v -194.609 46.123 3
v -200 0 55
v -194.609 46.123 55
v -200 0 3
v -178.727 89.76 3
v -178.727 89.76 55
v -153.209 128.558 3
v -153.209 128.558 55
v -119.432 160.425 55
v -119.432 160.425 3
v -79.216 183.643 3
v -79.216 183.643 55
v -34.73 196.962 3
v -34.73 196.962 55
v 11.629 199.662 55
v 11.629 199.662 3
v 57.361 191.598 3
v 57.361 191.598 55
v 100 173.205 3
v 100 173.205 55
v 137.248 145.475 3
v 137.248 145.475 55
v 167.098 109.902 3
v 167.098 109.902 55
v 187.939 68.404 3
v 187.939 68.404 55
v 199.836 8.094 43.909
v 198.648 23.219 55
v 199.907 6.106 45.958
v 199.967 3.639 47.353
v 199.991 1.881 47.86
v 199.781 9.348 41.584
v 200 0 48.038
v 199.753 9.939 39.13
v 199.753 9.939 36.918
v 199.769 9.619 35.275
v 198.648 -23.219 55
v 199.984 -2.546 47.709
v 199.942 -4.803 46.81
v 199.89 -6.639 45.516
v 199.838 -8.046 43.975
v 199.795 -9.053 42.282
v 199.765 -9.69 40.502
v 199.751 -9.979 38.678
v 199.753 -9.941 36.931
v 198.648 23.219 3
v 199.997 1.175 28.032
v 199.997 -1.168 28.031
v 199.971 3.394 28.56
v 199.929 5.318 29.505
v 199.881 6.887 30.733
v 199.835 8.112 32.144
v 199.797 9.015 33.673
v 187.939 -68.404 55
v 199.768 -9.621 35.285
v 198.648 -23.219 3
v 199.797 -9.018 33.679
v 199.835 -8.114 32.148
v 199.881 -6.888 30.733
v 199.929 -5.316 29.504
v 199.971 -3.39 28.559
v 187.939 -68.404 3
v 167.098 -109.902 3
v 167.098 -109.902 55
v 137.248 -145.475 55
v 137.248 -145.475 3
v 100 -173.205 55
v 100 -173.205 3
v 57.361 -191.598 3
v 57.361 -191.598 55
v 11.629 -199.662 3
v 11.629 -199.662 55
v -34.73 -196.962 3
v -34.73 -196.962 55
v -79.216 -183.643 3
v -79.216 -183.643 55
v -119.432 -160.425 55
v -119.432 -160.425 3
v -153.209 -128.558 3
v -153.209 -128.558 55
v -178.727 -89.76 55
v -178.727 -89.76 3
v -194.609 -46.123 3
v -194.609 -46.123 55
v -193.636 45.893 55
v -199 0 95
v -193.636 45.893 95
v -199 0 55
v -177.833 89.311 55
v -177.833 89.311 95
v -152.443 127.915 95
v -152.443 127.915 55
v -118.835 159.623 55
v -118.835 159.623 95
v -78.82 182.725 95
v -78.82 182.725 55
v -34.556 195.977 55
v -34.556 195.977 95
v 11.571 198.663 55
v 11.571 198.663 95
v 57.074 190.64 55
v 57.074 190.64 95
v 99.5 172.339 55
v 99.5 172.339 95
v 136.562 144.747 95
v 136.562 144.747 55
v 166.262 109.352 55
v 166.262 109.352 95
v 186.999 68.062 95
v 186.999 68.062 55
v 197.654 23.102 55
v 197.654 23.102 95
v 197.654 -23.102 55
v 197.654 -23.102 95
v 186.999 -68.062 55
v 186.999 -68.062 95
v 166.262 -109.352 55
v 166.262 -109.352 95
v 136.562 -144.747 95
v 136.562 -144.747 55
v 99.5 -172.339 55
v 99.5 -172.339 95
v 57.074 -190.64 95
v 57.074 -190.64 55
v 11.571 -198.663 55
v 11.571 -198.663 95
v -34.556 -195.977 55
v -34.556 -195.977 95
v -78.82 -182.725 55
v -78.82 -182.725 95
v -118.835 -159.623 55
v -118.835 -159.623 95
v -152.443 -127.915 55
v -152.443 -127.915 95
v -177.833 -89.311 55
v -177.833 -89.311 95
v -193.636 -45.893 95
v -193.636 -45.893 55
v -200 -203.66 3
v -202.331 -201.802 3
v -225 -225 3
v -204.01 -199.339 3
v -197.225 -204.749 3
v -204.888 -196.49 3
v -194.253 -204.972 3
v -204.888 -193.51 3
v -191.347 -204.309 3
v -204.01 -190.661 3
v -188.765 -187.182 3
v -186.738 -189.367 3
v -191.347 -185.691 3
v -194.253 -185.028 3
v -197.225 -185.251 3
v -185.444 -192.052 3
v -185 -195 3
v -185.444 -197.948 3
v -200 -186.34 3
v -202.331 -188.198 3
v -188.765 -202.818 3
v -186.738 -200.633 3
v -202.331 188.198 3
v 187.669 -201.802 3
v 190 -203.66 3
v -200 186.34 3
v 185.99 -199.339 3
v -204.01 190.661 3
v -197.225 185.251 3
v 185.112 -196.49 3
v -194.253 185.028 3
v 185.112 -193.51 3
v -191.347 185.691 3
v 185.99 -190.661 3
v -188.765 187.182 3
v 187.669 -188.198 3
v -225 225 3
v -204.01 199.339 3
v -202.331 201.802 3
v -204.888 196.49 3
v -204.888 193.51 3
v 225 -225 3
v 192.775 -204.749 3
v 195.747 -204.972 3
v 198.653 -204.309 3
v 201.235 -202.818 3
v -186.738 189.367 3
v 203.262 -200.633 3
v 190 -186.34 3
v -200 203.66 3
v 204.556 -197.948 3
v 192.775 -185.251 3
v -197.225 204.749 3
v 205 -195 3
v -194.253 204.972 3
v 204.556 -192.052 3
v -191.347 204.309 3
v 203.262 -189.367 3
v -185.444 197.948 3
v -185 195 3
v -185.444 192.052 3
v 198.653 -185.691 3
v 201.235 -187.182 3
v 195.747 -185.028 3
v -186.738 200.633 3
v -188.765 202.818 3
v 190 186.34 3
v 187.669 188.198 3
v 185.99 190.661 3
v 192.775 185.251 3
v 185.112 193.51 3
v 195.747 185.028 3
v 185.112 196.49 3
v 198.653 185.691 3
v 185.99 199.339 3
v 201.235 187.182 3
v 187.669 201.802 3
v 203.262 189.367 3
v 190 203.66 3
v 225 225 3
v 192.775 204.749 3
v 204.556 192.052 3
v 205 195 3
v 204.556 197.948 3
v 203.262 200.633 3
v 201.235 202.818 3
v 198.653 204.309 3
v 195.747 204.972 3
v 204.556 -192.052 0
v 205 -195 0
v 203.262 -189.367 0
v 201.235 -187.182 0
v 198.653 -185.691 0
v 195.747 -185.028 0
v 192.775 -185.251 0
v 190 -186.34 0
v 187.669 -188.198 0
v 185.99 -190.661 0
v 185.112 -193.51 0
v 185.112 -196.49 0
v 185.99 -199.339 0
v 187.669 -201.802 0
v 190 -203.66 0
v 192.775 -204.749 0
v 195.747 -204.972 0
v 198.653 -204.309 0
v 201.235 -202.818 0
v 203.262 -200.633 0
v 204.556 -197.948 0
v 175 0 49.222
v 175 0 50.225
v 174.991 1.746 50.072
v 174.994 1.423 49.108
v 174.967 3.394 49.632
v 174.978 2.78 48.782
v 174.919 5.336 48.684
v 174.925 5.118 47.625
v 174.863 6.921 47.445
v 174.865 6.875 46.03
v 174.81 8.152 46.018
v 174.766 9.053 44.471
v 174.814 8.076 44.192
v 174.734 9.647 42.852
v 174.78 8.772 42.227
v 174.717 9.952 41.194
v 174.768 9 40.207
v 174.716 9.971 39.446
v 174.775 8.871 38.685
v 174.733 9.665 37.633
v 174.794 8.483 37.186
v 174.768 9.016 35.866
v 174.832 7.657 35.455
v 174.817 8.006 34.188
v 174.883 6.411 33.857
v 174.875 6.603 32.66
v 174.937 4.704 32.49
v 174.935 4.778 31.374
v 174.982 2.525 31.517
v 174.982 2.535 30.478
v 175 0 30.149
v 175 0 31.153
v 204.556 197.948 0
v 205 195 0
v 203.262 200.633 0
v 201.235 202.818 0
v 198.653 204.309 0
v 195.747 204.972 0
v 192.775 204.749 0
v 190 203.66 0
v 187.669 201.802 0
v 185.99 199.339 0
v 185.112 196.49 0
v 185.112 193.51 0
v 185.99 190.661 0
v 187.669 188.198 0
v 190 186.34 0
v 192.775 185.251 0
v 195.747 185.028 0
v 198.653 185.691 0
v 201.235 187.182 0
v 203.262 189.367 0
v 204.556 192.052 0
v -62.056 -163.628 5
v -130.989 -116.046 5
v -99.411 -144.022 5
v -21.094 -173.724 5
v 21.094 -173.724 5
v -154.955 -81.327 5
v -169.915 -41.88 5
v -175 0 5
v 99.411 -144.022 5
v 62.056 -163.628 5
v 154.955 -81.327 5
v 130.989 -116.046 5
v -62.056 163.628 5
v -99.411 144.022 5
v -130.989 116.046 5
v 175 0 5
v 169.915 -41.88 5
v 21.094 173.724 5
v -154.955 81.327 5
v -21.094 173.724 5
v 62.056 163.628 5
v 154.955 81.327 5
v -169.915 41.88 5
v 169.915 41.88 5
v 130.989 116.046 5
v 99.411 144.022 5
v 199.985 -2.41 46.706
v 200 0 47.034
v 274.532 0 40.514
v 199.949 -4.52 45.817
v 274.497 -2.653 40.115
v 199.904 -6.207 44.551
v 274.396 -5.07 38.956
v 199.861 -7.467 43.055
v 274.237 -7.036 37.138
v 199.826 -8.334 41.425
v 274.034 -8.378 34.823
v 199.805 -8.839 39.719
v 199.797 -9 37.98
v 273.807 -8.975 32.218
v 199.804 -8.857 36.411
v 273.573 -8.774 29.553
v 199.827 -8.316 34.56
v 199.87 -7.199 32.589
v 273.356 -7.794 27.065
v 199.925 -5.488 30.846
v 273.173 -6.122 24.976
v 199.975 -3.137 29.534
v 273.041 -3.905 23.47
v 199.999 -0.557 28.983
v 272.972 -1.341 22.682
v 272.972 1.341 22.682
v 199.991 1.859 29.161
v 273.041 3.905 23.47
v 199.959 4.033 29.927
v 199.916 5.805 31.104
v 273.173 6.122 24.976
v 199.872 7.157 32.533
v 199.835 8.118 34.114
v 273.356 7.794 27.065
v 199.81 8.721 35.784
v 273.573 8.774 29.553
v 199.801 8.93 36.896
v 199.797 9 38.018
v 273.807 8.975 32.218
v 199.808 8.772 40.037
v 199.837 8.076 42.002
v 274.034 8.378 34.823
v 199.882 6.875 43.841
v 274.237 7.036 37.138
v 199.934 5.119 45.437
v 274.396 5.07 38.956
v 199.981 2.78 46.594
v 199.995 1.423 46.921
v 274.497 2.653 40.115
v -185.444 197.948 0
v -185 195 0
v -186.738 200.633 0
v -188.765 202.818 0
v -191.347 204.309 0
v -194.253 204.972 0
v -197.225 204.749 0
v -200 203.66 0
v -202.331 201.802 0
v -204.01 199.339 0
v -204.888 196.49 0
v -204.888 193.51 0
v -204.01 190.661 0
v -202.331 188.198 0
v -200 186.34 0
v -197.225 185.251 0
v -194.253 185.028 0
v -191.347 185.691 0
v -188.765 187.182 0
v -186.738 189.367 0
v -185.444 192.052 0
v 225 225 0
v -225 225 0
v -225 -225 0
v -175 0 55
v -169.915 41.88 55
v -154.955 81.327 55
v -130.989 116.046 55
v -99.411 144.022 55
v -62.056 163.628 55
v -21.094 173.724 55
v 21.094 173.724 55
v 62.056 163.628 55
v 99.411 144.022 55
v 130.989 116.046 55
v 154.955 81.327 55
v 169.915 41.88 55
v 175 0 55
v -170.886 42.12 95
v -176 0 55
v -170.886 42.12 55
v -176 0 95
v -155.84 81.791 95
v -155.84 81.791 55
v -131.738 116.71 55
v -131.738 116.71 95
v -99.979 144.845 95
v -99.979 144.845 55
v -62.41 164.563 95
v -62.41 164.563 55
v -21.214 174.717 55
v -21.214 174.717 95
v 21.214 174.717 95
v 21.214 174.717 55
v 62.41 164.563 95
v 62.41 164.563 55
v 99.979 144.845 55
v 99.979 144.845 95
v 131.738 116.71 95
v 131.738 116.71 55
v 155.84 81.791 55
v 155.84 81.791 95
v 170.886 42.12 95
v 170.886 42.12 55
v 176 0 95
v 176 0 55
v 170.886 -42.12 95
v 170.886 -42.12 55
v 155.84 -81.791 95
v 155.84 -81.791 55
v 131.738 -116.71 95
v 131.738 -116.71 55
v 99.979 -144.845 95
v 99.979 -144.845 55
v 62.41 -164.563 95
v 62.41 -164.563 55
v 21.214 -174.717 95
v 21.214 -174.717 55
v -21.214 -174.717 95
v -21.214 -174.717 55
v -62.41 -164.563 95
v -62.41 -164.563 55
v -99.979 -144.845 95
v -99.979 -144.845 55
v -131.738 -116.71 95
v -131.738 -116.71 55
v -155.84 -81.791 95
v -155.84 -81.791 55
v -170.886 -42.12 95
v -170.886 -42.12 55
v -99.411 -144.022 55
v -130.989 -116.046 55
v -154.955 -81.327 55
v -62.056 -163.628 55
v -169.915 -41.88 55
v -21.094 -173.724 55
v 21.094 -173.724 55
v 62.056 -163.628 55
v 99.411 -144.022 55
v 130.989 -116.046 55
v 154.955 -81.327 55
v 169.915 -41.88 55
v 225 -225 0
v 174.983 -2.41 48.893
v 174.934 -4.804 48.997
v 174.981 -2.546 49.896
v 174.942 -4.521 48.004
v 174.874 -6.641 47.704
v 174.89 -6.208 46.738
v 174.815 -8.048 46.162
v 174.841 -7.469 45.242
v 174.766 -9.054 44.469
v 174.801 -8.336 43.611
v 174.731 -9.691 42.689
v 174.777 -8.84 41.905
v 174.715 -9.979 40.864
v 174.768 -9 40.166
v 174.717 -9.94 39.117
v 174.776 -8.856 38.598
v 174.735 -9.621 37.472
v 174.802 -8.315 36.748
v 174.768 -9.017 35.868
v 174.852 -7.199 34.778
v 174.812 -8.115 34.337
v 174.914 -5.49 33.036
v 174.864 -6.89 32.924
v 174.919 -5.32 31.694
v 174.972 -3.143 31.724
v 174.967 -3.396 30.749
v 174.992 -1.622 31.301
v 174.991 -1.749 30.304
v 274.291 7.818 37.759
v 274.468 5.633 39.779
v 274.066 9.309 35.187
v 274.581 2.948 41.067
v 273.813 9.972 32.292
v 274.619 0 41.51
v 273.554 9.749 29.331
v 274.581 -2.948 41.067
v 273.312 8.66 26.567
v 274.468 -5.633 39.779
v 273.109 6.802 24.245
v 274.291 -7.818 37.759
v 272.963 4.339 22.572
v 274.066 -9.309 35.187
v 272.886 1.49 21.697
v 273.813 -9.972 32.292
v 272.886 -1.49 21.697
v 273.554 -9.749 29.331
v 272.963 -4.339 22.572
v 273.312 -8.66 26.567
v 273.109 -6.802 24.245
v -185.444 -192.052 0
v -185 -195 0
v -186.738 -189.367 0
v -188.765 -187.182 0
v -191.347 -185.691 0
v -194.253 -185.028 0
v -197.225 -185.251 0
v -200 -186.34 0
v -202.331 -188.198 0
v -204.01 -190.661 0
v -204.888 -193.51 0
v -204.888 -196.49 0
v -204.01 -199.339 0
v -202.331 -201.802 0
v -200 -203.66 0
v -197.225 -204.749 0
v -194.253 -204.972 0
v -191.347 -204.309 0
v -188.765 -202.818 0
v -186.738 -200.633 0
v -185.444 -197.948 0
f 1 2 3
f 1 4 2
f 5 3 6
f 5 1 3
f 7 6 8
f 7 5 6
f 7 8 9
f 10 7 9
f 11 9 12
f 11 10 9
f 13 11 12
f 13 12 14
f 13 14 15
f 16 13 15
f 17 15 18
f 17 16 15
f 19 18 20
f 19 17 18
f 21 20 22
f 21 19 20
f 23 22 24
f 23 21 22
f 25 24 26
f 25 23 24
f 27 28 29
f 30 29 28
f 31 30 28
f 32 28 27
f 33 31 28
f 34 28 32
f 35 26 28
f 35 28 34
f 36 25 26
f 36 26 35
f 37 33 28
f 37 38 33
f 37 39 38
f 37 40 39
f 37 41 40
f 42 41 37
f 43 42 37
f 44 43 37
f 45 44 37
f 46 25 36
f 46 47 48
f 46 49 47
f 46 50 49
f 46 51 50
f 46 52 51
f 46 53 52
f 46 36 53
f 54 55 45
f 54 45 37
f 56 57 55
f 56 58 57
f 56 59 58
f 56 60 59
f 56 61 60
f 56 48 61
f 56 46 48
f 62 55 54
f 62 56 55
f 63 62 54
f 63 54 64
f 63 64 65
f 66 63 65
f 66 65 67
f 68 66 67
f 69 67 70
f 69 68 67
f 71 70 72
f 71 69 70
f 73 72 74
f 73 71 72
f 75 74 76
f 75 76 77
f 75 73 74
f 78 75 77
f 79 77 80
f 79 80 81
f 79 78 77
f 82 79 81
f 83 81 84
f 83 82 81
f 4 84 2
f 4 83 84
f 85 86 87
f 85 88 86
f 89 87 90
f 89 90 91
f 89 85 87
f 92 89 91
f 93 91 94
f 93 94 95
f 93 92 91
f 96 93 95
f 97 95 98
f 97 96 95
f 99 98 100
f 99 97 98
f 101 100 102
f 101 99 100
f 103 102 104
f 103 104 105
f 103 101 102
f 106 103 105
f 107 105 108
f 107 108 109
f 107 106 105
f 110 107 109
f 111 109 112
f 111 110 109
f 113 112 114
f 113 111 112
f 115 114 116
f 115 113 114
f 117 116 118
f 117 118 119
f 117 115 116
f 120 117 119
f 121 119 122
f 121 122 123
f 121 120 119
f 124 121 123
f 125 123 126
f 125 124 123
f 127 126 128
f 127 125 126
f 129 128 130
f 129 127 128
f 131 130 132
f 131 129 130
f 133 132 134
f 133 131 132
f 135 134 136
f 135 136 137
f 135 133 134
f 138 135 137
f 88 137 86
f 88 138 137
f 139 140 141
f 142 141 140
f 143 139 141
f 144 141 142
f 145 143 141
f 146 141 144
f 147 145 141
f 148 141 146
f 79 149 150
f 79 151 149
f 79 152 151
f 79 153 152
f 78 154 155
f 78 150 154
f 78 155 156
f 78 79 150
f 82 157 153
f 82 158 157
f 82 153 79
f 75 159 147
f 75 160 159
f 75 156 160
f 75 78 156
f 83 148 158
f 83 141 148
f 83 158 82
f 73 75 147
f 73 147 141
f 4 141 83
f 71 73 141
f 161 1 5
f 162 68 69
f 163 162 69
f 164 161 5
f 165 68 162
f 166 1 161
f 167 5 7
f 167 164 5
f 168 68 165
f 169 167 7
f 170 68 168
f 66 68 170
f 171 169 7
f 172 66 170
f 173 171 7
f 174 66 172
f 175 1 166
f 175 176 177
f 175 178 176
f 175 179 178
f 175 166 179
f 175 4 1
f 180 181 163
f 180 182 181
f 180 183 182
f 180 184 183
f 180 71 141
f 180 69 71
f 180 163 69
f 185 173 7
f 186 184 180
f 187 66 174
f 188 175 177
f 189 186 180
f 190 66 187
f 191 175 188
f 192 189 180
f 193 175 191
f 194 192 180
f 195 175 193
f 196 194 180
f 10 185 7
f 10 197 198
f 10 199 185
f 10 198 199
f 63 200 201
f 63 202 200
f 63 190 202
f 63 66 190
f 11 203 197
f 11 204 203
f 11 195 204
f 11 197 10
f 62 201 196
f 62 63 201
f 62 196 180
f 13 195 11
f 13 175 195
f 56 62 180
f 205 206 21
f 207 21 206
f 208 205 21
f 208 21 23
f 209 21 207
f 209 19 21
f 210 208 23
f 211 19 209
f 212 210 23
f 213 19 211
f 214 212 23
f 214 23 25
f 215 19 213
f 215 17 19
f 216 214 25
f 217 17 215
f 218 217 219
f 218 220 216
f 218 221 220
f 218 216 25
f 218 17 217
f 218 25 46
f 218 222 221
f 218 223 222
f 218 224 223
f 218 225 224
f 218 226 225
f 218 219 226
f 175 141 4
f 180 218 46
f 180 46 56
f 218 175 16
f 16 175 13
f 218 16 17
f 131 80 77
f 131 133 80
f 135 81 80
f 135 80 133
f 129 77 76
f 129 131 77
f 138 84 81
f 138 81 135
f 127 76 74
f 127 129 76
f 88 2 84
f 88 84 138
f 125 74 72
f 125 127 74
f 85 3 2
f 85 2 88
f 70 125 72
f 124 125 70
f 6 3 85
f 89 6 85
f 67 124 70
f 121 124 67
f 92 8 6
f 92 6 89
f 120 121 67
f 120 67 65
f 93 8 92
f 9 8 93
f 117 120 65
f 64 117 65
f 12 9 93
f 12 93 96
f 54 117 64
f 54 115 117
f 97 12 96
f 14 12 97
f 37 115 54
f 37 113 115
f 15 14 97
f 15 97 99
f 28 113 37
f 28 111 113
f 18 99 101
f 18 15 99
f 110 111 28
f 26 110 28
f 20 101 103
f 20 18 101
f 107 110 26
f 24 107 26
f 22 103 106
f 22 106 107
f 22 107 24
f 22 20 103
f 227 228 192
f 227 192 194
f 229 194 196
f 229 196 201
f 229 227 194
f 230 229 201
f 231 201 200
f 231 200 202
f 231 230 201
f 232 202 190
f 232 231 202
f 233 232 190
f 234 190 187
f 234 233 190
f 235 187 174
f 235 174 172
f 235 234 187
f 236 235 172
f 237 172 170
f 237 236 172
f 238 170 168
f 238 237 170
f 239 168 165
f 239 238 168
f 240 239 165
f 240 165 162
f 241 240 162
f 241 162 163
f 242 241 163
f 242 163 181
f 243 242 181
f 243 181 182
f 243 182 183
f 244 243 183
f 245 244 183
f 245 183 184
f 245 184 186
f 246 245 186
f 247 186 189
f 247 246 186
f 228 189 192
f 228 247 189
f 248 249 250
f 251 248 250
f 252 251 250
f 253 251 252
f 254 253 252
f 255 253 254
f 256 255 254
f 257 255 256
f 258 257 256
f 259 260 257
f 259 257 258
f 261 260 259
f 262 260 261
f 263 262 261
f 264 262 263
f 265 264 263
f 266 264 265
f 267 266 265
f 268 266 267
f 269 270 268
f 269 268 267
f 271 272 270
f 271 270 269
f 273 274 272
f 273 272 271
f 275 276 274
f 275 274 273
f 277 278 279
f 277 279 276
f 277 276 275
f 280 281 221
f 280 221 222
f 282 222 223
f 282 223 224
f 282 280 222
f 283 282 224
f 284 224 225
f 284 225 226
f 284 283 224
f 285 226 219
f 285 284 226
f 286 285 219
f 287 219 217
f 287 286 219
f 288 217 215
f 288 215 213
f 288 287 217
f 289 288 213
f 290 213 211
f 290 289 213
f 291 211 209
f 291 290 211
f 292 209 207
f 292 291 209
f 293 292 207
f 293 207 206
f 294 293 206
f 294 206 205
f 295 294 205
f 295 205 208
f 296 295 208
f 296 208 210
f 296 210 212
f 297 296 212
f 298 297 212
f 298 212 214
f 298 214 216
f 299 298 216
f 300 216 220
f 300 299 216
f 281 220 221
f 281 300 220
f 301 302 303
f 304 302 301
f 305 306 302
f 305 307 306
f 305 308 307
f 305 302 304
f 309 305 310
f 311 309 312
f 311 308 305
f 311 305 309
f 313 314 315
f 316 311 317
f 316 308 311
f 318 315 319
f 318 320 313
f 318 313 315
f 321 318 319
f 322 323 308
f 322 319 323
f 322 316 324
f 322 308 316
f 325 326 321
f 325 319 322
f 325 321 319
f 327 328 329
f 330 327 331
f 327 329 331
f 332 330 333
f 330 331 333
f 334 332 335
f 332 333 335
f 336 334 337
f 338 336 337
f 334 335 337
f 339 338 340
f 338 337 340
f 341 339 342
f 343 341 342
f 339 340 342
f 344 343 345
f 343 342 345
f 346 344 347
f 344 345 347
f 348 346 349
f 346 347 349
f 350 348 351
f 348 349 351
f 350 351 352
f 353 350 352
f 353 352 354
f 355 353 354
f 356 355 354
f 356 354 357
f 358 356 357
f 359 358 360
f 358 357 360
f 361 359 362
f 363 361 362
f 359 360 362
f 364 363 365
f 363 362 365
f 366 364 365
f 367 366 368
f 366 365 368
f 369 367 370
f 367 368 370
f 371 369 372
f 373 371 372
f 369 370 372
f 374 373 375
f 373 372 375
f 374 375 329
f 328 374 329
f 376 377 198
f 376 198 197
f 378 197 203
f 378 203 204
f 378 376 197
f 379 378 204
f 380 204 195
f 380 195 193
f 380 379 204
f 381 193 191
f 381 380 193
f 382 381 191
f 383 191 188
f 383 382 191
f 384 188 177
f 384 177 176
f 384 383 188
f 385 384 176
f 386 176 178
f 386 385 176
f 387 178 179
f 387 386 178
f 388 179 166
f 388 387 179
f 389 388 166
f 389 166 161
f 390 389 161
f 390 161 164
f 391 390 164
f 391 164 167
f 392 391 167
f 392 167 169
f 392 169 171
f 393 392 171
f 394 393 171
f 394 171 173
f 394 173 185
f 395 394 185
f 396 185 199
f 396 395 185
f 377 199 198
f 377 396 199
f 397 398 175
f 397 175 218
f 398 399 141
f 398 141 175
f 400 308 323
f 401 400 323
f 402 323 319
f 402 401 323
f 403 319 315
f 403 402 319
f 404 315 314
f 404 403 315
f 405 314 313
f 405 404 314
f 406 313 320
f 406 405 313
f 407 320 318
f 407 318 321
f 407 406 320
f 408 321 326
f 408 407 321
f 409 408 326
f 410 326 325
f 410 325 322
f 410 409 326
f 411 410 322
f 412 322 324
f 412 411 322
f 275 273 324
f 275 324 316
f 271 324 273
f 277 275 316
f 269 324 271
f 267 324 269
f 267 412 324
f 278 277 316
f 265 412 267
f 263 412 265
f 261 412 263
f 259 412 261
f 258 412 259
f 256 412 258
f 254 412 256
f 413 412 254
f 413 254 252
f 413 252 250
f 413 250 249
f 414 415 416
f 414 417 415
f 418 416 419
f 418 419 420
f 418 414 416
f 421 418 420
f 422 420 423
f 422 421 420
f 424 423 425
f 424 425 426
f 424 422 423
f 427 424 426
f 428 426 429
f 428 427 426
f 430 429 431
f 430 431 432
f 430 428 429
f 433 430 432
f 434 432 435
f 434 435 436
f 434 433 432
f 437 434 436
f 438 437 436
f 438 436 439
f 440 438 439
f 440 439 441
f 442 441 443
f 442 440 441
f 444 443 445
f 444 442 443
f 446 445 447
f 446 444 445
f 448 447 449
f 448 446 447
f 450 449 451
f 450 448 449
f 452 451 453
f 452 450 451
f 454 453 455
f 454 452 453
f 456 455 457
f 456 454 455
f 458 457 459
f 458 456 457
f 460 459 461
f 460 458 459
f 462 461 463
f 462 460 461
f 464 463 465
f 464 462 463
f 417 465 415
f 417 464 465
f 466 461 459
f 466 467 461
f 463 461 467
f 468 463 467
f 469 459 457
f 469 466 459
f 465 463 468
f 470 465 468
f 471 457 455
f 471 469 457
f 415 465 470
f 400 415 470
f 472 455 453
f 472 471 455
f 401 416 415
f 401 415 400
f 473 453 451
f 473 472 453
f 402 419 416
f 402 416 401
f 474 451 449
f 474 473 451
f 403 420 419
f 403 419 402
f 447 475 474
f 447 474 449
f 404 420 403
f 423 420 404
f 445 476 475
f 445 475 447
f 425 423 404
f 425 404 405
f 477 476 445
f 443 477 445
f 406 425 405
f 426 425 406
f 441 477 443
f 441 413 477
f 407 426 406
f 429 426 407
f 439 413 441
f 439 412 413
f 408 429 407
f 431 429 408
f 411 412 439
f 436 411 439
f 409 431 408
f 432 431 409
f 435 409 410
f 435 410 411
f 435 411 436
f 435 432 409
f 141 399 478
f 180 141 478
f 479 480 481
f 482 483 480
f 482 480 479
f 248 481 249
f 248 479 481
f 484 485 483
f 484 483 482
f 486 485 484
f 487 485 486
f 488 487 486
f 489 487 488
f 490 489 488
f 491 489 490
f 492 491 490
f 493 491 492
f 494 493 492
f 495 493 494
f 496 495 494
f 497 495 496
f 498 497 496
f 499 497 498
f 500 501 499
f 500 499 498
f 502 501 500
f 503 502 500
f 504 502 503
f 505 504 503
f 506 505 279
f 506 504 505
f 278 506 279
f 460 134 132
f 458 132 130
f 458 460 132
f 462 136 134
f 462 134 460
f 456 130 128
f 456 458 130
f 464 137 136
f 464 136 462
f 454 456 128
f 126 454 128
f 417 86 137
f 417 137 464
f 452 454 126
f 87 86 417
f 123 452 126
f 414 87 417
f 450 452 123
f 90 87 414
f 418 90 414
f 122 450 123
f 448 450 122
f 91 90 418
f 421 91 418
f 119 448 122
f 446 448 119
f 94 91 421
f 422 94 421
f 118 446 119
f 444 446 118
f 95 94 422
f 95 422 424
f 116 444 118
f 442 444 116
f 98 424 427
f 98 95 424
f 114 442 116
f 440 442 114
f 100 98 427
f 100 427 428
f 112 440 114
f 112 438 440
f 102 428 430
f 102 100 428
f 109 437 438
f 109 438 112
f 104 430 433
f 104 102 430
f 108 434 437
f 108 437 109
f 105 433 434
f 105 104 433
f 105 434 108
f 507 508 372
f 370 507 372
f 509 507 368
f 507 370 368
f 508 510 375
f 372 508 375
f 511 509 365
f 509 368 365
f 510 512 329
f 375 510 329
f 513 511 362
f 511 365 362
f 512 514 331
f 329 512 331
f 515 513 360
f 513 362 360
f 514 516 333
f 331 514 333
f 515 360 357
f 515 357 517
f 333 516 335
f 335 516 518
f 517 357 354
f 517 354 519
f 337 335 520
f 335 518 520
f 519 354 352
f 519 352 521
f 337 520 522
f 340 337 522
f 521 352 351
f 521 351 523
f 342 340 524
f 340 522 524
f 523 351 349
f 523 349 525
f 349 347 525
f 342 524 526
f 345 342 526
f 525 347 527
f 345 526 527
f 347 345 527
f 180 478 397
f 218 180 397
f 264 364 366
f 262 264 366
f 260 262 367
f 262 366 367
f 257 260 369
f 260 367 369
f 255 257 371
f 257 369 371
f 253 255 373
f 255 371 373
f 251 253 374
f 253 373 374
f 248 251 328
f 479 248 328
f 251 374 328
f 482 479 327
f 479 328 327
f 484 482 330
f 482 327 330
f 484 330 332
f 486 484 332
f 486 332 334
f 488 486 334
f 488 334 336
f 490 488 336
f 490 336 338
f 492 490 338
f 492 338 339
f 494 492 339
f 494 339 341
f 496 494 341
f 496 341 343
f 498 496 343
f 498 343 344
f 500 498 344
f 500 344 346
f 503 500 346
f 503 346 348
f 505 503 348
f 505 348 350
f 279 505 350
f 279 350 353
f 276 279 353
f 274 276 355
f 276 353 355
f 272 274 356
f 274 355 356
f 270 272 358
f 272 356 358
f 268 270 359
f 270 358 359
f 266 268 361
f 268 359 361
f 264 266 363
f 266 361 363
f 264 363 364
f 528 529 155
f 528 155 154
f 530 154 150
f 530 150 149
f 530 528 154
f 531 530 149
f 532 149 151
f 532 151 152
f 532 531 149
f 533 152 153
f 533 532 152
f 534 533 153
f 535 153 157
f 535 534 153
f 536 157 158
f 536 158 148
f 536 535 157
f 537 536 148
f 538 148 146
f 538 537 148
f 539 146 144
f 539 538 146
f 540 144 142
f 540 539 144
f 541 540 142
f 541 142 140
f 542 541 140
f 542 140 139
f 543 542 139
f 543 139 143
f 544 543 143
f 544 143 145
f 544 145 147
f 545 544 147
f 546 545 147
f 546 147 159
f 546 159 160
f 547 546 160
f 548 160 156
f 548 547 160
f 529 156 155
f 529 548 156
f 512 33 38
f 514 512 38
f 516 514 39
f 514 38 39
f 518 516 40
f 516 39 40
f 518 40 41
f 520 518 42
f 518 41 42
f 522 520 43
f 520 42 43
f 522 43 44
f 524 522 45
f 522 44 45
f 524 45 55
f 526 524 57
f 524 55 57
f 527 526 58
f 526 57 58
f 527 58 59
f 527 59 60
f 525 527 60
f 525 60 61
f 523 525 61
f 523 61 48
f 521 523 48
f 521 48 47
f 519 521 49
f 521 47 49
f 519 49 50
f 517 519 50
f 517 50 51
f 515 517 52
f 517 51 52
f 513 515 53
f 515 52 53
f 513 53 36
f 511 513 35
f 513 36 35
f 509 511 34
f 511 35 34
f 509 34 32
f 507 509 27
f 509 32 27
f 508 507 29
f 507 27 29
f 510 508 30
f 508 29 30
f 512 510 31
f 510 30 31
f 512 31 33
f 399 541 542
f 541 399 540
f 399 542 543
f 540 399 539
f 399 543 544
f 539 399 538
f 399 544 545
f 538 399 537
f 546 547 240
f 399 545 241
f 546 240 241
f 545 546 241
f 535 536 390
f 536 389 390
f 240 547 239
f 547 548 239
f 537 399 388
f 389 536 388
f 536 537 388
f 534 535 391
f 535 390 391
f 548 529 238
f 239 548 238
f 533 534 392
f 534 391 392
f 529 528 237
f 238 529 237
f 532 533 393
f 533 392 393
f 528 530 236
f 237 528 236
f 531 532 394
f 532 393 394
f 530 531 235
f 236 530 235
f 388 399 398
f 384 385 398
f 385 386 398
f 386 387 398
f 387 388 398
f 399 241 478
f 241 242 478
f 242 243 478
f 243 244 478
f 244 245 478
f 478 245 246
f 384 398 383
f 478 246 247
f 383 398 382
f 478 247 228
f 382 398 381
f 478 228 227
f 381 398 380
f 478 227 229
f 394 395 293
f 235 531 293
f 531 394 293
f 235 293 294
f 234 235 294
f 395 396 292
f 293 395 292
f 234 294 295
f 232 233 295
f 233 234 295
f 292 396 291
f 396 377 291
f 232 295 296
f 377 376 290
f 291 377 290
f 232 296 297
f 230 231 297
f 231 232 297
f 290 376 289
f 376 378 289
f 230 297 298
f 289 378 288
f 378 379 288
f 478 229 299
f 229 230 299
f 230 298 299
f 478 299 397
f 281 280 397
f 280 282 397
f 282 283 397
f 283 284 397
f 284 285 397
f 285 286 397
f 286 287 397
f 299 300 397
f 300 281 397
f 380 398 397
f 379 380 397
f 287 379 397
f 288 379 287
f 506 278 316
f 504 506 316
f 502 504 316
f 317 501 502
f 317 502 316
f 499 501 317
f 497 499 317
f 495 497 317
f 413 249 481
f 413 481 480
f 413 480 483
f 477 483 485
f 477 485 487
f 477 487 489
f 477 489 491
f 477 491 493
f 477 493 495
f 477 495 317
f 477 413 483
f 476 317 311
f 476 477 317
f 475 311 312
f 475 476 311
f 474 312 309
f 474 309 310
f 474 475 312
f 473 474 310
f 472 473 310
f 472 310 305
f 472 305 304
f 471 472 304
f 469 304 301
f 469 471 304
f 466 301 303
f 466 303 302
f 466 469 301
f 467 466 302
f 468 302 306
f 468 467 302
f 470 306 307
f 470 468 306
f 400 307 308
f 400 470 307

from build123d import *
from build123d import SkipClean  # not in build123d's __all__

# Parameters (mm, degrees)
F0_W     = 10
F0_H     = 3
F2_W     = 450
F2_H     = 450
F2_R     = 10
F3_DEPTH = 3
F6_R     = 9
F7_DEPTH = 120
F8_R     = 175
F9_DEPTH = 200


with BuildPart() as f1:
    # F0 (on Front) → F1 (revolve)
    with BuildSketch(Plane.XZ):
        Polygon((-200, 5), (-175, 5), (-175, 55), (-176, 55), (-176, 95), (-199, 95), (-199, 55), (-200, 55), align=None)
        Polygon((-10, 5), (-175, 5), (-200, 5), (-200, 2), (-10, 2), align=None)
        with Locations((-5, 3.5)):
            Rectangle(F0_W, F0_H)
    revolve(axis=Axis((0, 0, 187.9212413023), (0, 0, -1)))

    # F2 (on Top) → F3 (join)
    with BuildSketch(Plane.XY):
        Rectangle(F2_W, F2_H)
        with Locations((-195, -195)):
            Circle(F2_R, mode=Mode.SUBTRACT)
        with Locations((195, -195)):
            Circle(F2_R, mode=Mode.SUBTRACT)
        with Locations((-195, 195)):
            Circle(F2_R, mode=Mode.SUBTRACT)
        with Locations((195, 195)):
            Circle(F2_R, mode=Mode.SUBTRACT)
    extrude(amount=F3_DEPTH)

    # F4 (on Front) → F5 (revolve)
    with BuildSketch(Plane.XZ):
        Polygon((274.6194698092, 41.5098406888), (175, 50.2254149636), (174.9128442573, 49.2292202655), (274.5323140664, 40.5136459907), align=None)
    revolve(axis=Axis((287.7442754949, 0, 30.3233706049), (0.9961946981, 0, -0.0871557427)))

    # F6 (on face) → F7 (cut)
    with BuildSketch(Plane(origin=(268.9293723072, 0, -23.528271366), x_dir=(0, 1, 0), z_dir=(0.9961946981, 0, -0.0871557427))):
        with Locations((0, 55.286547077)):
            Circle(F6_R)
    extrude(amount=-F7_DEPTH, mode=Mode.SUBTRACT)

    # F8 (on face) → F9 (cut)
    with BuildSketch(Plane.XY.offset(5)):
        Circle(F8_R)
    with SkipClean():  # cleaning this boolean's faces spoils the solid; the shape is the same uncleaned
        extrude(amount=F9_DEPTH, mode=Mode.SUBTRACT)


solid = f1.part
